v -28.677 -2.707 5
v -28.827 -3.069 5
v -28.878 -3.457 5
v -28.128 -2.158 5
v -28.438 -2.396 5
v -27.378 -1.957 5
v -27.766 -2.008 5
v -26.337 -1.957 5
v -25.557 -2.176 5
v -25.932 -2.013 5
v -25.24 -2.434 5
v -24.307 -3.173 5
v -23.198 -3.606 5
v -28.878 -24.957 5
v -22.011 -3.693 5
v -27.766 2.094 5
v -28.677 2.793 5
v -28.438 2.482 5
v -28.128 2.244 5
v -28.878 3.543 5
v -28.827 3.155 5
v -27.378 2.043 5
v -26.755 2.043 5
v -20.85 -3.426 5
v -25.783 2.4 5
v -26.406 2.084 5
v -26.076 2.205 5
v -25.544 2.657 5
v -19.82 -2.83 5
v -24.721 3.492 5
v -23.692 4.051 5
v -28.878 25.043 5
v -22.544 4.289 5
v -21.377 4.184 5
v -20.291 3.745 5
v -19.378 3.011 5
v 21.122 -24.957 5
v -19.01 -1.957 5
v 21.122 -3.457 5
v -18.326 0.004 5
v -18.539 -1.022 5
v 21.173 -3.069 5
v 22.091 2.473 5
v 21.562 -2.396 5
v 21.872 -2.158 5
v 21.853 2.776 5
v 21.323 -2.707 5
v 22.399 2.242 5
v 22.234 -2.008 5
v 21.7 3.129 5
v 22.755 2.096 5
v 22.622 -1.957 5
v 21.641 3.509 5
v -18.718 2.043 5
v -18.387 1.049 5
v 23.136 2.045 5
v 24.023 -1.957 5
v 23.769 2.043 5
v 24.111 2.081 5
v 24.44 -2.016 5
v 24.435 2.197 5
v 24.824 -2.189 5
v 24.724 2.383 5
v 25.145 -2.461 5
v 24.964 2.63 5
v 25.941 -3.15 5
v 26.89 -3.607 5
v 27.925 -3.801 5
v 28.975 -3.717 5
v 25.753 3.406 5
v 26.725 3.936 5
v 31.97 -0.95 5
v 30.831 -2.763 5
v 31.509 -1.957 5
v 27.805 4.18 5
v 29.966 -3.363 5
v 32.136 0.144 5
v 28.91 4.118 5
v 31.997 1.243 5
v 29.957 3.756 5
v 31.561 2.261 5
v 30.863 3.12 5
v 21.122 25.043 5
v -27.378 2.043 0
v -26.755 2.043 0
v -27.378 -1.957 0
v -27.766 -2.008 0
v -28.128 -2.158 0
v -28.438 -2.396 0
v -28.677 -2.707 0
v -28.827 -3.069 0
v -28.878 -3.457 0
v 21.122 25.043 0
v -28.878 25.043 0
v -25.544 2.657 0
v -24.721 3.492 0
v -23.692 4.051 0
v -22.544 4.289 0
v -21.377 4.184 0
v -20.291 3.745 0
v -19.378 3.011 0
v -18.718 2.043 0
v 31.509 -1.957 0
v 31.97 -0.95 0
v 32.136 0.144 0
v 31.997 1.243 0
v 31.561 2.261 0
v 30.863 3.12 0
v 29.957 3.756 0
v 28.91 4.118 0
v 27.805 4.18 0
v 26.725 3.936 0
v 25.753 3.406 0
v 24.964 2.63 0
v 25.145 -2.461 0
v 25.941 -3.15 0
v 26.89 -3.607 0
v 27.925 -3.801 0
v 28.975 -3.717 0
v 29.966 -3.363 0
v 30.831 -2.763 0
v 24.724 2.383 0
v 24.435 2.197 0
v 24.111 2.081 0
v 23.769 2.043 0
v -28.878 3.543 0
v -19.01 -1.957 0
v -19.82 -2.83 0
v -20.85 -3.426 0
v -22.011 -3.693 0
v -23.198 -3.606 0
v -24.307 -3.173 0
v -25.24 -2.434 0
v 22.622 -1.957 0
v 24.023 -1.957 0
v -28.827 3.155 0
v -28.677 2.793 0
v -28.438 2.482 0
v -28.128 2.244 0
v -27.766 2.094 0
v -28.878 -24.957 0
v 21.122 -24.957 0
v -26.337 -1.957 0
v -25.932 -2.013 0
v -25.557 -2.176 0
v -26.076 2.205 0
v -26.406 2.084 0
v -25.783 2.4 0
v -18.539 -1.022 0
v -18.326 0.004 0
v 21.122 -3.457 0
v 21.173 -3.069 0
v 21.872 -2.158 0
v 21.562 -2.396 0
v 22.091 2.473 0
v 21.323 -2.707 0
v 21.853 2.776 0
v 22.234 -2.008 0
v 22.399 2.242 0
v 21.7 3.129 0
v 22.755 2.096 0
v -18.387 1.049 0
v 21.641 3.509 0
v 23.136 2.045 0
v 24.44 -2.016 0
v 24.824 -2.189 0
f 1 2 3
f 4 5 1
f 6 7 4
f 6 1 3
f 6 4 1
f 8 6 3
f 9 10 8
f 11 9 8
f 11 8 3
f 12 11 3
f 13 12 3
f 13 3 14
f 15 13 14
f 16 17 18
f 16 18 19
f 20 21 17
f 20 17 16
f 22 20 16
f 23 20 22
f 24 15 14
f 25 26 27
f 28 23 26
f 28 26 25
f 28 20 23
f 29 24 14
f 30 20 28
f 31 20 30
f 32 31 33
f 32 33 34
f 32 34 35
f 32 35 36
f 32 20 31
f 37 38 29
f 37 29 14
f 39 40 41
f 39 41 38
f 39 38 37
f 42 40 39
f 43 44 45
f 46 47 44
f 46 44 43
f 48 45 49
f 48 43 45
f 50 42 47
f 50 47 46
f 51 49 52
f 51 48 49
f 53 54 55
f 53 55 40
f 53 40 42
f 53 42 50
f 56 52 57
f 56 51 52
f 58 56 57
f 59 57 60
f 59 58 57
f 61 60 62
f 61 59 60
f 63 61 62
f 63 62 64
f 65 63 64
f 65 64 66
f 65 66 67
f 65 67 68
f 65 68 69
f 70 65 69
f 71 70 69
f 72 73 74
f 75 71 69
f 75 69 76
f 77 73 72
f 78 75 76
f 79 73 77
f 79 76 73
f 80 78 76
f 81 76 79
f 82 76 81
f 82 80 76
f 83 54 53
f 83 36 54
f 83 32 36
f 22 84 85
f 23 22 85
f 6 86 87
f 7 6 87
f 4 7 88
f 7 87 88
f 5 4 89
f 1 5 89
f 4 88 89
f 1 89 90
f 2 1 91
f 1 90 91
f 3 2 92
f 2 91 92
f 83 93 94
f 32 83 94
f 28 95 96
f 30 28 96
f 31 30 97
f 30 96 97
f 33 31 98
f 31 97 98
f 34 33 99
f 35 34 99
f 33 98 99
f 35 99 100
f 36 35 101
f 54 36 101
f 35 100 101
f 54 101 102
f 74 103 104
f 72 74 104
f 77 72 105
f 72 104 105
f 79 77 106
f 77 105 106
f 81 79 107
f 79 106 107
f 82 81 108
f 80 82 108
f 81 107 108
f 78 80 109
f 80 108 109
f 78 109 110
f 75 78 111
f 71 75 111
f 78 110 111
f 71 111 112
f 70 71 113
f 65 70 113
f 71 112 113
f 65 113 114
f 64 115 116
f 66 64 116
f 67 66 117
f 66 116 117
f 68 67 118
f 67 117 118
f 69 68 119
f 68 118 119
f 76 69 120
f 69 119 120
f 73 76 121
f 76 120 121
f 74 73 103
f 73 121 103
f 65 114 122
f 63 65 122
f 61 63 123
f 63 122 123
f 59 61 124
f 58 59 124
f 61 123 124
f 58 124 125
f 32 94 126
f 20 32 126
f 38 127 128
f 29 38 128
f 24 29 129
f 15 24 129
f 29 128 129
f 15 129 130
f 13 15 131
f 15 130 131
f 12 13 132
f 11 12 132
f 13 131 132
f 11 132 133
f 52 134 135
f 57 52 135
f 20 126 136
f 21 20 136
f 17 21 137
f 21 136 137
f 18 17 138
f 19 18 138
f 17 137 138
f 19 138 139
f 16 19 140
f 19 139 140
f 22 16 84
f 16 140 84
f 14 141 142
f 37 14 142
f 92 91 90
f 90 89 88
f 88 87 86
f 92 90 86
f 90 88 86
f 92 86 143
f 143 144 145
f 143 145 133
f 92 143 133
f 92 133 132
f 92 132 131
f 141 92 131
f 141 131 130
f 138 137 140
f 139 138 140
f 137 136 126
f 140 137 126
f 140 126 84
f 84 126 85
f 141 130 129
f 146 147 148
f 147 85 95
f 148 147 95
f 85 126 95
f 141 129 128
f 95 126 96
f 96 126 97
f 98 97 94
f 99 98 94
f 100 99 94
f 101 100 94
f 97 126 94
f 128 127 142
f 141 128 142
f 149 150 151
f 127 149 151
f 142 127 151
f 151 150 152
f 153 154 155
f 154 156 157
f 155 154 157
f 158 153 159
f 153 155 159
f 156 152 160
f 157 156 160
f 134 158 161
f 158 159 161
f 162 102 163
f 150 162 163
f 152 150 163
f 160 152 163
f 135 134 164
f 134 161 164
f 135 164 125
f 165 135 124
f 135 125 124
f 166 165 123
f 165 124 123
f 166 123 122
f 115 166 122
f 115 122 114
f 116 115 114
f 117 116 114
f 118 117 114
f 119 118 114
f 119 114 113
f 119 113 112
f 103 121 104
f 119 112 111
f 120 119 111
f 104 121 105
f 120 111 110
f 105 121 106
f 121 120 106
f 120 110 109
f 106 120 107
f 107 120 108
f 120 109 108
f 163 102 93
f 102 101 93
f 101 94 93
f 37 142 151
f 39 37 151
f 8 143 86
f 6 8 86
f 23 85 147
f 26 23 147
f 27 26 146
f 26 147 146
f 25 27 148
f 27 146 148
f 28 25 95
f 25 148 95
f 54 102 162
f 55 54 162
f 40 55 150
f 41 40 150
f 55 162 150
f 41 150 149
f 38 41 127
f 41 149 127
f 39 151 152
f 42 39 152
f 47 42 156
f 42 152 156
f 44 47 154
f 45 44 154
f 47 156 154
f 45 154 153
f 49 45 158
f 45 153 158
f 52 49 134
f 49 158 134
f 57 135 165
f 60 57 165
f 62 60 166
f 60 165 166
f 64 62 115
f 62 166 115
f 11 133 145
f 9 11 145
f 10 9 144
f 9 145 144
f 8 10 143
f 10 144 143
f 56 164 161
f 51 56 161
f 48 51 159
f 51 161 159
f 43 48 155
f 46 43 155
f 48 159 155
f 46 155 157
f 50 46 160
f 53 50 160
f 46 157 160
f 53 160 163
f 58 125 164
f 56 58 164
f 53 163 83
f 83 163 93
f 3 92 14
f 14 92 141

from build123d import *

# Parameters (mm, degrees)
F1_DEPTH = 5


with BuildPart() as f1:
    # F0 (on Top) → F1 (new body)
    with BuildSketch(Plane.XY):
        with BuildLine():
            Line((21.641407, 3.508914), (21.122372, 25.04304))
            Line((21.122372, 25.04304), (-28.877628, 25.04304))
            Line((-28.877628, 25.04304), (-28.877628, 3.54304))
            ThreePointArc((-28.877628, 3.54304), (-28.438288, 2.48238), (-27.377628, 2.04304))
            Line((-27.377628, 2.04304), (-26.754604, 2.04304))
            ThreePointArc((-26.754604, 2.04304), (-26.075812, 2.205415), (-25.543978, 2.657385))
            ThreePointArc((-25.543978, 2.657385), (-21.957112, 4.279539), (-18.717504, 2.04304))
            ThreePointArc((-18.717504, 2.04304), (-18.326309, 0.003702), (-19.010222, -1.95696))
            ThreePointArc((-19.010222, -1.95696), (-22.01054, -3.692708), (-25.239965, -2.433524))
            ThreePointArc((-25.239965, -2.433524), (-25.738738, -2.08125), (-26.336586, -1.95696))
            Line((-26.336586, -1.95696), (-27.377628, -1.95696))
            ThreePointArc((-27.377628, -1.95696), (-28.438288, -2.3963), (-28.877628, -3.45696))
            Line((-28.877628, -3.45696), (-28.877628, -24.95696))
            Line((-28.877628, -24.95696), (21.122372, -24.95696))
            Line((21.122372, -24.95696), (21.122372, -3.45696))
            ThreePointArc((21.122372, -3.45696), (21.561712, -2.3963), (22.622372, -1.95696))
            Line((22.622372, -1.95696), (24.022886, -1.95696))
            ThreePointArc((24.022886, -1.95696), (24.637921, -2.088847), (25.144802, -2.461317))
            ThreePointArc((25.144802, -2.461317), (28.452575, -3.793768), (31.509193, -1.95696))
            ThreePointArc((31.509193, -1.95696), (30.43203, 3.469536), (24.963791, 2.629592))
            ThreePointArc((24.963791, 2.629592), (24.435111, 2.19659), (23.769215, 2.043048))
            Line((23.769215, 2.043048), (23.136191, 2.045066))
            ThreePointArc((23.136191, 2.045066), (22.091459, 2.473366), (21.641407, 3.508914))
        make_face()
    extrude(amount=F1_DEPTH)


solid = f1.part
